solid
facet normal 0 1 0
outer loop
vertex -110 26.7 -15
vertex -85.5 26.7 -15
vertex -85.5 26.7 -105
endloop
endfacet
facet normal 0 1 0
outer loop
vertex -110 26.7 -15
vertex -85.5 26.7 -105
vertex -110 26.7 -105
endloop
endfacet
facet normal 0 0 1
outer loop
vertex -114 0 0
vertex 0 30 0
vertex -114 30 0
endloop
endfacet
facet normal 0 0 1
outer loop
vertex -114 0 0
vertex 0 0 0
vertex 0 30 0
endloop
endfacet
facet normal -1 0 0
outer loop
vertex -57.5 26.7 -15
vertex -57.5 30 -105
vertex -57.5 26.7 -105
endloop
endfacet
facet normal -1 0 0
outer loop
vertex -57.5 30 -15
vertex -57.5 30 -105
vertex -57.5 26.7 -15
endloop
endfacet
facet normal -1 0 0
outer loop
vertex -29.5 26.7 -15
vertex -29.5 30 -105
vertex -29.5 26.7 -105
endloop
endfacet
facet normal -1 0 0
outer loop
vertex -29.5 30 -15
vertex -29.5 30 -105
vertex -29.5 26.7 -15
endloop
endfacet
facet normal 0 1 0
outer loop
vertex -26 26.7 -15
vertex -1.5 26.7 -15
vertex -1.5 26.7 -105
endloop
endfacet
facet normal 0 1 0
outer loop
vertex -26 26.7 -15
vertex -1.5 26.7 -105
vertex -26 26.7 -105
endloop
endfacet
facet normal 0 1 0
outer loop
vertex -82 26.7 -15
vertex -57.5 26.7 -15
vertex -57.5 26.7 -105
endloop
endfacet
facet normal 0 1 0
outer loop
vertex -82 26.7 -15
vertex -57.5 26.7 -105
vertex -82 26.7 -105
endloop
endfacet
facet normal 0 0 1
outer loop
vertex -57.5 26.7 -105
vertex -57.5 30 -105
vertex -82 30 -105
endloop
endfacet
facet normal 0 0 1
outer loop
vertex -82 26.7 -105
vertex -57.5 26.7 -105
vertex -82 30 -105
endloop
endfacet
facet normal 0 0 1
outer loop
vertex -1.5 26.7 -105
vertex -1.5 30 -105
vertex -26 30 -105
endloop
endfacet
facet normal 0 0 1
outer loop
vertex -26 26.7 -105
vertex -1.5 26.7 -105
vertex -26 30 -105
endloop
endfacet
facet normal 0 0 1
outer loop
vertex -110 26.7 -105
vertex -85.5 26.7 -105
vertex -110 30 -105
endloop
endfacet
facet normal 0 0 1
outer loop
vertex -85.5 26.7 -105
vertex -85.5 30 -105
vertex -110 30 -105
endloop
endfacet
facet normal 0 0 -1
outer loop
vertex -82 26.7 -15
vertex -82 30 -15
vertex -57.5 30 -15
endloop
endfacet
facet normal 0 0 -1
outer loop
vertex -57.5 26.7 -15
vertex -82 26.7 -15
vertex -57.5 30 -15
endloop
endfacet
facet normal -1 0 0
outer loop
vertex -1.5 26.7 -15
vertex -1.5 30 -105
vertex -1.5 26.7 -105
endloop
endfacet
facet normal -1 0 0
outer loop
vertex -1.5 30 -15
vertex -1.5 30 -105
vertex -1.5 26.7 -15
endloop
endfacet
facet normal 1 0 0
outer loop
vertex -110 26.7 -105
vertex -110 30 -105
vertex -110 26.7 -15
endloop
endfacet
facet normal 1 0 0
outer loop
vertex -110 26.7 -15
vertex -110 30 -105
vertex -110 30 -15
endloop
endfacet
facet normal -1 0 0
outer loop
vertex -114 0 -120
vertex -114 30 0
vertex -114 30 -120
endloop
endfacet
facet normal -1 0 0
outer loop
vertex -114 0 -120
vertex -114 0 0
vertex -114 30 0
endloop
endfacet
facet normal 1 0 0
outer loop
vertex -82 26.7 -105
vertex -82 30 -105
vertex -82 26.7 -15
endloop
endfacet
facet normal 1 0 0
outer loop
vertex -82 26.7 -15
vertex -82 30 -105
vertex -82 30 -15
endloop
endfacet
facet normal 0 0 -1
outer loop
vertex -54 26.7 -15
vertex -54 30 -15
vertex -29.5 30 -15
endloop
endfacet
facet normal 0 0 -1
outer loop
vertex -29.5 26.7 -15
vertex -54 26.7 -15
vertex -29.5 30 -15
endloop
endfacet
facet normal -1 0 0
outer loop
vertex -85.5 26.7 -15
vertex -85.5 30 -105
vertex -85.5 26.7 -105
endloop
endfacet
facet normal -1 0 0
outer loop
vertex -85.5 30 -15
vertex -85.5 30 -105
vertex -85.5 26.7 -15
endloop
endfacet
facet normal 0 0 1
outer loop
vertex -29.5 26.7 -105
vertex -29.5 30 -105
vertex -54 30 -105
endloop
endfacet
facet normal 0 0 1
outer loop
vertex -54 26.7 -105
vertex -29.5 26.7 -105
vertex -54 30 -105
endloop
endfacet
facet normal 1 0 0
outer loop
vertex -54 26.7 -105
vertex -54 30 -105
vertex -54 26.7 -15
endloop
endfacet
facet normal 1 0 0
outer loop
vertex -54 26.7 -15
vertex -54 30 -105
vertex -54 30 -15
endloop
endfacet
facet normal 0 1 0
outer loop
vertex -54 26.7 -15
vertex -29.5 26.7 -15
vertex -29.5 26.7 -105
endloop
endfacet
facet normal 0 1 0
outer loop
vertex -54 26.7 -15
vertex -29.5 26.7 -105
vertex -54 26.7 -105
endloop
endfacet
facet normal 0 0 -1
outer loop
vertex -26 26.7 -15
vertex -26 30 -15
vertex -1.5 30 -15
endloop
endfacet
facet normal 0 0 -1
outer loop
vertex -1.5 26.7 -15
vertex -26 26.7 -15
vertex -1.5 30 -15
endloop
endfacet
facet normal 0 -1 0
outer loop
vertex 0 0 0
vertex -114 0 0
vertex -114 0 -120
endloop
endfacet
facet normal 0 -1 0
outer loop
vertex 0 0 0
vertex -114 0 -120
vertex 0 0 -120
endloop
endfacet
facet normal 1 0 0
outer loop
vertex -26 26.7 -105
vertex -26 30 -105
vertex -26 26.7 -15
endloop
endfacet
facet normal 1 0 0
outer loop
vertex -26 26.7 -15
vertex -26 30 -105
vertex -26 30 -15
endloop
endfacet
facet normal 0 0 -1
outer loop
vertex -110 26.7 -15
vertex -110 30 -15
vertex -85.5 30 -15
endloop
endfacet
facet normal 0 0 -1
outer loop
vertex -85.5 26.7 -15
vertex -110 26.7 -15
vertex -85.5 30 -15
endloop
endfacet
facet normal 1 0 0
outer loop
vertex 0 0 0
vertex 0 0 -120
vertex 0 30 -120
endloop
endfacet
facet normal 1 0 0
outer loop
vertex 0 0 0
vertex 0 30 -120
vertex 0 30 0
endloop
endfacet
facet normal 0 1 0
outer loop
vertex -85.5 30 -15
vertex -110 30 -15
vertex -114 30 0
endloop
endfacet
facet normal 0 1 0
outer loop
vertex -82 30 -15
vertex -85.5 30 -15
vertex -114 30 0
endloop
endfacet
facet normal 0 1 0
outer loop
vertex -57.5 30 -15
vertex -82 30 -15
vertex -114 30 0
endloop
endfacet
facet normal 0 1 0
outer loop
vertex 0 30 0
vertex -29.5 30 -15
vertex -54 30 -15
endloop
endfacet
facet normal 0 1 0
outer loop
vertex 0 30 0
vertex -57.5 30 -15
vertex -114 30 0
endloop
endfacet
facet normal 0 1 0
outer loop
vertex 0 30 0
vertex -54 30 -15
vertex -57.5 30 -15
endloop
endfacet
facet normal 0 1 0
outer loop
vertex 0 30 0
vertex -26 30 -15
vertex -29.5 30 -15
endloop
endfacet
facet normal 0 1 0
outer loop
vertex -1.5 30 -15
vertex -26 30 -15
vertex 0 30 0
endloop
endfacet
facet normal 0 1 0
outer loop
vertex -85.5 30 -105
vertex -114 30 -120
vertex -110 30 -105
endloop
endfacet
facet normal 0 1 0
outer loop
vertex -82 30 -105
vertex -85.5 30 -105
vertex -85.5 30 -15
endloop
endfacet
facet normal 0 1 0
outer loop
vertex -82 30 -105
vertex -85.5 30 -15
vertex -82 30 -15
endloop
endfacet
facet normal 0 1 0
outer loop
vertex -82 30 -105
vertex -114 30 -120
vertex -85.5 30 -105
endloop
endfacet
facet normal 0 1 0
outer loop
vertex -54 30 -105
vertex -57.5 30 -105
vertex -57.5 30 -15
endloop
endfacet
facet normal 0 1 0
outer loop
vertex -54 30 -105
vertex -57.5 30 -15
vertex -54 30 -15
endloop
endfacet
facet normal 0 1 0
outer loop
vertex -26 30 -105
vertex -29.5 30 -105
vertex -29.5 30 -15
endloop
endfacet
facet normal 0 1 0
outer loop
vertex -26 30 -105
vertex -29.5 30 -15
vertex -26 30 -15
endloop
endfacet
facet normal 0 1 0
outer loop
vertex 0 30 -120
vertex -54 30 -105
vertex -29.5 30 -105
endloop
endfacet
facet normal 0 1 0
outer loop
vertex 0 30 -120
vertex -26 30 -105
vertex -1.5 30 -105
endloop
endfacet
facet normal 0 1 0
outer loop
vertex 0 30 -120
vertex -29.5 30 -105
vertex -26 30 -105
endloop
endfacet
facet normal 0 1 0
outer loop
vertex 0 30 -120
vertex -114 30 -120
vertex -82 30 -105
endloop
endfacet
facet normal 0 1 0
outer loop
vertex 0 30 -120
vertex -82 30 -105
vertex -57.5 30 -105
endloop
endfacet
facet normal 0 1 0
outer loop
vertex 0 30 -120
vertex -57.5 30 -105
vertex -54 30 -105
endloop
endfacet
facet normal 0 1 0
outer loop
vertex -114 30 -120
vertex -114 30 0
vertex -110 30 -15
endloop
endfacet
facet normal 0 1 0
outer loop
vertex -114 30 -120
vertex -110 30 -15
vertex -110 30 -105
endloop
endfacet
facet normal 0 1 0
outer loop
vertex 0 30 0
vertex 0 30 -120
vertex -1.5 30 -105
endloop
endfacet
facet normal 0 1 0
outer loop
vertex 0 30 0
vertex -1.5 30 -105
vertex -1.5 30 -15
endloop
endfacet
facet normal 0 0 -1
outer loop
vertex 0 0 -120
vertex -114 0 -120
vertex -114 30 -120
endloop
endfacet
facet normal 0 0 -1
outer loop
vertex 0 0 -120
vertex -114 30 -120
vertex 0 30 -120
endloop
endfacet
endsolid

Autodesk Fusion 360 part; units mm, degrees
sketch "スケッチ1" plane through (0, 0, 0) normal (0, 1, 0) x (1, 0, 0)
  line L0 (0, 0) -> (-114, 0)
  line L1 (-114, 0) -> (-114, 120)
  line L2 (-114, 120) -> (0, 120)
  line L3 (0, 120) -> (0, 0)
  dimension "d1" = 114
  dimension "d2" = 120
extrude "押し出し1" add sketch "スケッチ1" along normal blind 40
sketch "スケッチ2" plane through (0, 40, 0) normal (0, 1, 0) x (-1, 0, 0)
  line L0 (0, -120) -> (114, -120)
  line L1 (114, -120) -> (114, 0)
  line L2 (114, 0) -> (0, 0)
  line L3 (0, 0) -> (0, -120)
  line L4 (0, -105) -> (1.5, -105)
  line L5 (1.5, -105) -> (1.5, -15)
  line L6 (1.5, -15) -> (0, -15)
  line L7 (0, -15) -> (0, -105)
  line L8 (1.5, -105) -> (26, -105)
  line L9 (26, -105) -> (26, -15)
  line L10 (26, -15) -> (1.5, -15)
  line L11 (1.5, -15) -> (1.5, -105)
  line L12 (26, -105) -> (29.5, -105)
  line L13 (29.5, -105) -> (29.5, -15)
  line L14 (29.5, -15) -> (26, -15)
  line L15 (26, -15) -> (26, -105)
  line L16 (29.5, -105) -> (54, -105)
  line L17 (54, -105) -> (54, -15)
  line L18 (54, -15) -> (29.5, -15)
  line L19 (29.5, -15) -> (29.5, -105)
  line L20 (54, -105) -> (57.5, -105)
  line L21 (57.5, -105) -> (57.5, -15)
  line L22 (57.5, -15) -> (54, -15)
  line L23 (54, -15) -> (54, -105)
  line L24 (57.5, -105) -> (82, -105)
  line L25 (82, -105) -> (82, -15)
  line L26 (82, -15) -> (57.5, -15)
  line L27 (57.5, -15) -> (57.5, -105)
  line L28 (82, -105) -> (85.5, -105)
  line L29 (85.5, -105) -> (85.5, -15)
  line L30 (85.5, -15) -> (82, -15)
  line L31 (82, -15) -> (82, -105)
  line L32 (85.5, -105) -> (110, -105)
  line L33 (110, -105) -> (110, -15)
  line L34 (110, -15) -> (85.5, -15)
  line L35 (85.5, -15) -> (85.5, -105)
  line L36 (110, -105) -> (114, -105)
  line L37 (114, -105) -> (114, -15)
  line L38 (114, -15) -> (110, -15)
  line L39 (110, -15) -> (110, -105)
  dimension "d5" = 1.5
  dimension "d6" = 90
  dimension "d7" = 24.5
  dimension "d8" = 90
  dimension "d9" = 3.5
  dimension "d10" = 90
  dimension "d11" = 24.5
  dimension "d12" = 90
  dimension "d13" = 3.5
  dimension "d14" = 90
  dimension "d15" = 24.5
  dimension "d16" = 90
  dimension "d17" = 3.5
  dimension "d18" = 90
  dimension "d19" = 24.5
  dimension "d20" = 90
  dimension "d21" = 4
  dimension "d22" = 90
extrude "押し出し2" cut sketch "スケッチ2" against normal blind 3 contours L29 L32 L33 L34 L35 L39
sketch "スケッチ3" plane through (0, 40, 0) normal (0, 1, 0) x (-1, 0, 0)
  line L0 (110, -105) -> (85.5, -105)
  line L1 (85.5, -105) -> (85.5, -15)
  line L2 (85.5, -15) -> (110, -15)
  line L3 (110, -15) -> (110, -105)
  line L4 (0, -120) -> (114, -120)
  line L5 (114, -120) -> (114, 0)
  line L6 (114, 0) -> (0, 0)
  line L7 (0, 0) -> (0, -120)
  line L8 (0, -105) -> (1.5, -105)
  line L9 (1.5, -105) -> (1.5, -15)
  line L10 (1.5, -15) -> (0, -15)
  line L11 (0, -15) -> (0, -105)
  line L12 (1.5, -105) -> (26, -105)
  line L13 (26, -105) -> (26, -15)
  line L14 (26, -15) -> (1.5, -15)
  line L15 (1.5, -15) -> (1.5, -105)
  dimension "d25" = 1.5
  dimension "d26" = 90
  dimension "d27" = 24.5
  dimension "d28" = 90
extrude "押し出し3" cut sketch "スケッチ3" against normal blind 3 contours L9 L12 L13 L14 L15
extrude "押し出し4" cut 1 faces at (-93.6667, 37, -45) along direction (0, -1, 0) blind 0.3
extrude "押し出し5" cut 1 faces at (-9.6667, 37, -45) along direction (0, -1, 0) blind 0.3
sketch "スケッチ4" plane through (0, 40, 0) normal (0, 1, 0) x (-1, 0, 0)
  line L0 (26, -105) -> (1.5, -105)
  line L1 (1.5, -105) -> (1.5, -15)
  line L2 (1.5, -15) -> (26, -15)
  line L3 (26, -15) -> (26, -105)
  line L4 (110, -105) -> (85.5, -105)
  line L5 (85.5, -105) -> (85.5, -15)
  line L6 (85.5, -15) -> (110, -15)
  line L7 (110, -15) -> (110, -105)
  line L8 (0, -120) -> (114, -120)
  line L9 (114, -120) -> (114, 0)
  line L10 (114, 0) -> (0, 0)
  line L11 (0, 0) -> (0, -120)
  line L12 (26, -105) -> (29.5, -105)
  line L13 (29.5, -105) -> (29.5, -15)
  line L14 (29.5, -15) -> (26, -15)
  line L15 (26, -15) -> (26, -105)
  line L16 (29.5, -105) -> (54, -105)
  line L17 (54, -105) -> (54, -15)
  line L18 (54, -15) -> (29.5, -15)
  line L19 (29.5, -15) -> (29.5, -105)
  dimension "d35" = 3.5
  dimension "d36" = 90
  dimension "d37" = 24.5
  dimension "d38" = 90
extrude "押し出し6" cut sketch "スケッチ4" against normal blind 3.3 contours L13 L16 L17 L18 L19
sketch "スケッチ5" plane through (0, 40, 0) normal (0, 1, 0) x (-1, 0, 0)
  line L0 (54, -105) -> (29.5, -105)
  line L1 (29.5, -105) -> (29.5, -15)
  line L2 (29.5, -15) -> (54, -15)
  line L3 (54, -15) -> (54, -105)
  line L4 (26, -105) -> (1.5, -105)
  line L5 (1.5, -105) -> (1.5, -15)
  line L6 (1.5, -15) -> (26, -15)
  line L7 (26, -15) -> (26, -105)
  line L8 (110, -105) -> (85.5, -105)
  line L9 (85.5, -105) -> (85.5, -15)
  line L10 (85.5, -15) -> (110, -15)
  line L11 (110, -15) -> (110, -105)
  line L12 (0, -120) -> (114, -120)
  line L13 (114, -120) -> (114, 0)
  line L14 (114, 0) -> (0, 0)
  line L15 (0, 0) -> (0, -120)
  line L16 (54, -105) -> (57.5, -105)
  line L17 (57.5, -105) -> (57.5, -15)
  line L18 (57.5, -15) -> (54, -15)
  line L19 (54, -15) -> (54, -105)
  line L20 (57.5, -105) -> (82, -105)
  line L21 (82, -105) -> (82, -15)
  line L22 (82, -15) -> (57.5, -15)
  line L23 (57.5, -15) -> (57.5, -105)
  dimension "d41" = 3.5
  dimension "d42" = 90
  dimension "d43" = 24.5
  dimension "d44" = 90
extrude "押し出し7" cut sketch "スケッチ5" against normal blind 3.3 contours L17 L20 L21 L22 L23
extrude "押し出し8" cut 4 faces at (-93.6667, 36.7, -45) (-65.6667, 36.7, -45) (-37.6667, 36.7, -45) (-9.6667, 36.7, -45) along direction (0, -1, 0) blind 10
extrude "押し出し9" cut 1 faces at (-57.1667, 40, -5) along direction (0, -1, 0) blind 10
